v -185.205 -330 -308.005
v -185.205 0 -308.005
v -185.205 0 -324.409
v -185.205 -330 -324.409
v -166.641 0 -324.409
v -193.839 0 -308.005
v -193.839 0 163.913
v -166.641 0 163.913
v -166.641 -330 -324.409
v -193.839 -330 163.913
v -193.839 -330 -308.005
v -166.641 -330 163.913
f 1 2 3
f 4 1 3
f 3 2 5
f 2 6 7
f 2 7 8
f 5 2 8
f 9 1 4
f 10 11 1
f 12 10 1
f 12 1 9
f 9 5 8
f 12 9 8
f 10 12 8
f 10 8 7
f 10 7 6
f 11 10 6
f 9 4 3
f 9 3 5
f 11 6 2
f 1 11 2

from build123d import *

# Parameters (mm, degrees)
F2_DEPTH = 330


# Not quite as in the source:
# - a feature of the source that left no trace in its solid (it failed there, or was rolled back) is left out


with BuildPart() as f2:
    # F0 (on Front) → F2 (new body)
    with BuildSketch(Plane.XZ):
        Polygon((-166.6411012411, 147.3953723907), (-166.6411012411, 163.9132797718), (-193.8388049603, 163.9132797718), (-193.8388049603, -308.0049455166), (-185.2051019669, -308.0049455166), (-185.2051019669, -324.4089782238), (-166.6411012411, -324.4089782238), align=None)
    extrude(amount=F2_DEPTH)


solid = f2.part
